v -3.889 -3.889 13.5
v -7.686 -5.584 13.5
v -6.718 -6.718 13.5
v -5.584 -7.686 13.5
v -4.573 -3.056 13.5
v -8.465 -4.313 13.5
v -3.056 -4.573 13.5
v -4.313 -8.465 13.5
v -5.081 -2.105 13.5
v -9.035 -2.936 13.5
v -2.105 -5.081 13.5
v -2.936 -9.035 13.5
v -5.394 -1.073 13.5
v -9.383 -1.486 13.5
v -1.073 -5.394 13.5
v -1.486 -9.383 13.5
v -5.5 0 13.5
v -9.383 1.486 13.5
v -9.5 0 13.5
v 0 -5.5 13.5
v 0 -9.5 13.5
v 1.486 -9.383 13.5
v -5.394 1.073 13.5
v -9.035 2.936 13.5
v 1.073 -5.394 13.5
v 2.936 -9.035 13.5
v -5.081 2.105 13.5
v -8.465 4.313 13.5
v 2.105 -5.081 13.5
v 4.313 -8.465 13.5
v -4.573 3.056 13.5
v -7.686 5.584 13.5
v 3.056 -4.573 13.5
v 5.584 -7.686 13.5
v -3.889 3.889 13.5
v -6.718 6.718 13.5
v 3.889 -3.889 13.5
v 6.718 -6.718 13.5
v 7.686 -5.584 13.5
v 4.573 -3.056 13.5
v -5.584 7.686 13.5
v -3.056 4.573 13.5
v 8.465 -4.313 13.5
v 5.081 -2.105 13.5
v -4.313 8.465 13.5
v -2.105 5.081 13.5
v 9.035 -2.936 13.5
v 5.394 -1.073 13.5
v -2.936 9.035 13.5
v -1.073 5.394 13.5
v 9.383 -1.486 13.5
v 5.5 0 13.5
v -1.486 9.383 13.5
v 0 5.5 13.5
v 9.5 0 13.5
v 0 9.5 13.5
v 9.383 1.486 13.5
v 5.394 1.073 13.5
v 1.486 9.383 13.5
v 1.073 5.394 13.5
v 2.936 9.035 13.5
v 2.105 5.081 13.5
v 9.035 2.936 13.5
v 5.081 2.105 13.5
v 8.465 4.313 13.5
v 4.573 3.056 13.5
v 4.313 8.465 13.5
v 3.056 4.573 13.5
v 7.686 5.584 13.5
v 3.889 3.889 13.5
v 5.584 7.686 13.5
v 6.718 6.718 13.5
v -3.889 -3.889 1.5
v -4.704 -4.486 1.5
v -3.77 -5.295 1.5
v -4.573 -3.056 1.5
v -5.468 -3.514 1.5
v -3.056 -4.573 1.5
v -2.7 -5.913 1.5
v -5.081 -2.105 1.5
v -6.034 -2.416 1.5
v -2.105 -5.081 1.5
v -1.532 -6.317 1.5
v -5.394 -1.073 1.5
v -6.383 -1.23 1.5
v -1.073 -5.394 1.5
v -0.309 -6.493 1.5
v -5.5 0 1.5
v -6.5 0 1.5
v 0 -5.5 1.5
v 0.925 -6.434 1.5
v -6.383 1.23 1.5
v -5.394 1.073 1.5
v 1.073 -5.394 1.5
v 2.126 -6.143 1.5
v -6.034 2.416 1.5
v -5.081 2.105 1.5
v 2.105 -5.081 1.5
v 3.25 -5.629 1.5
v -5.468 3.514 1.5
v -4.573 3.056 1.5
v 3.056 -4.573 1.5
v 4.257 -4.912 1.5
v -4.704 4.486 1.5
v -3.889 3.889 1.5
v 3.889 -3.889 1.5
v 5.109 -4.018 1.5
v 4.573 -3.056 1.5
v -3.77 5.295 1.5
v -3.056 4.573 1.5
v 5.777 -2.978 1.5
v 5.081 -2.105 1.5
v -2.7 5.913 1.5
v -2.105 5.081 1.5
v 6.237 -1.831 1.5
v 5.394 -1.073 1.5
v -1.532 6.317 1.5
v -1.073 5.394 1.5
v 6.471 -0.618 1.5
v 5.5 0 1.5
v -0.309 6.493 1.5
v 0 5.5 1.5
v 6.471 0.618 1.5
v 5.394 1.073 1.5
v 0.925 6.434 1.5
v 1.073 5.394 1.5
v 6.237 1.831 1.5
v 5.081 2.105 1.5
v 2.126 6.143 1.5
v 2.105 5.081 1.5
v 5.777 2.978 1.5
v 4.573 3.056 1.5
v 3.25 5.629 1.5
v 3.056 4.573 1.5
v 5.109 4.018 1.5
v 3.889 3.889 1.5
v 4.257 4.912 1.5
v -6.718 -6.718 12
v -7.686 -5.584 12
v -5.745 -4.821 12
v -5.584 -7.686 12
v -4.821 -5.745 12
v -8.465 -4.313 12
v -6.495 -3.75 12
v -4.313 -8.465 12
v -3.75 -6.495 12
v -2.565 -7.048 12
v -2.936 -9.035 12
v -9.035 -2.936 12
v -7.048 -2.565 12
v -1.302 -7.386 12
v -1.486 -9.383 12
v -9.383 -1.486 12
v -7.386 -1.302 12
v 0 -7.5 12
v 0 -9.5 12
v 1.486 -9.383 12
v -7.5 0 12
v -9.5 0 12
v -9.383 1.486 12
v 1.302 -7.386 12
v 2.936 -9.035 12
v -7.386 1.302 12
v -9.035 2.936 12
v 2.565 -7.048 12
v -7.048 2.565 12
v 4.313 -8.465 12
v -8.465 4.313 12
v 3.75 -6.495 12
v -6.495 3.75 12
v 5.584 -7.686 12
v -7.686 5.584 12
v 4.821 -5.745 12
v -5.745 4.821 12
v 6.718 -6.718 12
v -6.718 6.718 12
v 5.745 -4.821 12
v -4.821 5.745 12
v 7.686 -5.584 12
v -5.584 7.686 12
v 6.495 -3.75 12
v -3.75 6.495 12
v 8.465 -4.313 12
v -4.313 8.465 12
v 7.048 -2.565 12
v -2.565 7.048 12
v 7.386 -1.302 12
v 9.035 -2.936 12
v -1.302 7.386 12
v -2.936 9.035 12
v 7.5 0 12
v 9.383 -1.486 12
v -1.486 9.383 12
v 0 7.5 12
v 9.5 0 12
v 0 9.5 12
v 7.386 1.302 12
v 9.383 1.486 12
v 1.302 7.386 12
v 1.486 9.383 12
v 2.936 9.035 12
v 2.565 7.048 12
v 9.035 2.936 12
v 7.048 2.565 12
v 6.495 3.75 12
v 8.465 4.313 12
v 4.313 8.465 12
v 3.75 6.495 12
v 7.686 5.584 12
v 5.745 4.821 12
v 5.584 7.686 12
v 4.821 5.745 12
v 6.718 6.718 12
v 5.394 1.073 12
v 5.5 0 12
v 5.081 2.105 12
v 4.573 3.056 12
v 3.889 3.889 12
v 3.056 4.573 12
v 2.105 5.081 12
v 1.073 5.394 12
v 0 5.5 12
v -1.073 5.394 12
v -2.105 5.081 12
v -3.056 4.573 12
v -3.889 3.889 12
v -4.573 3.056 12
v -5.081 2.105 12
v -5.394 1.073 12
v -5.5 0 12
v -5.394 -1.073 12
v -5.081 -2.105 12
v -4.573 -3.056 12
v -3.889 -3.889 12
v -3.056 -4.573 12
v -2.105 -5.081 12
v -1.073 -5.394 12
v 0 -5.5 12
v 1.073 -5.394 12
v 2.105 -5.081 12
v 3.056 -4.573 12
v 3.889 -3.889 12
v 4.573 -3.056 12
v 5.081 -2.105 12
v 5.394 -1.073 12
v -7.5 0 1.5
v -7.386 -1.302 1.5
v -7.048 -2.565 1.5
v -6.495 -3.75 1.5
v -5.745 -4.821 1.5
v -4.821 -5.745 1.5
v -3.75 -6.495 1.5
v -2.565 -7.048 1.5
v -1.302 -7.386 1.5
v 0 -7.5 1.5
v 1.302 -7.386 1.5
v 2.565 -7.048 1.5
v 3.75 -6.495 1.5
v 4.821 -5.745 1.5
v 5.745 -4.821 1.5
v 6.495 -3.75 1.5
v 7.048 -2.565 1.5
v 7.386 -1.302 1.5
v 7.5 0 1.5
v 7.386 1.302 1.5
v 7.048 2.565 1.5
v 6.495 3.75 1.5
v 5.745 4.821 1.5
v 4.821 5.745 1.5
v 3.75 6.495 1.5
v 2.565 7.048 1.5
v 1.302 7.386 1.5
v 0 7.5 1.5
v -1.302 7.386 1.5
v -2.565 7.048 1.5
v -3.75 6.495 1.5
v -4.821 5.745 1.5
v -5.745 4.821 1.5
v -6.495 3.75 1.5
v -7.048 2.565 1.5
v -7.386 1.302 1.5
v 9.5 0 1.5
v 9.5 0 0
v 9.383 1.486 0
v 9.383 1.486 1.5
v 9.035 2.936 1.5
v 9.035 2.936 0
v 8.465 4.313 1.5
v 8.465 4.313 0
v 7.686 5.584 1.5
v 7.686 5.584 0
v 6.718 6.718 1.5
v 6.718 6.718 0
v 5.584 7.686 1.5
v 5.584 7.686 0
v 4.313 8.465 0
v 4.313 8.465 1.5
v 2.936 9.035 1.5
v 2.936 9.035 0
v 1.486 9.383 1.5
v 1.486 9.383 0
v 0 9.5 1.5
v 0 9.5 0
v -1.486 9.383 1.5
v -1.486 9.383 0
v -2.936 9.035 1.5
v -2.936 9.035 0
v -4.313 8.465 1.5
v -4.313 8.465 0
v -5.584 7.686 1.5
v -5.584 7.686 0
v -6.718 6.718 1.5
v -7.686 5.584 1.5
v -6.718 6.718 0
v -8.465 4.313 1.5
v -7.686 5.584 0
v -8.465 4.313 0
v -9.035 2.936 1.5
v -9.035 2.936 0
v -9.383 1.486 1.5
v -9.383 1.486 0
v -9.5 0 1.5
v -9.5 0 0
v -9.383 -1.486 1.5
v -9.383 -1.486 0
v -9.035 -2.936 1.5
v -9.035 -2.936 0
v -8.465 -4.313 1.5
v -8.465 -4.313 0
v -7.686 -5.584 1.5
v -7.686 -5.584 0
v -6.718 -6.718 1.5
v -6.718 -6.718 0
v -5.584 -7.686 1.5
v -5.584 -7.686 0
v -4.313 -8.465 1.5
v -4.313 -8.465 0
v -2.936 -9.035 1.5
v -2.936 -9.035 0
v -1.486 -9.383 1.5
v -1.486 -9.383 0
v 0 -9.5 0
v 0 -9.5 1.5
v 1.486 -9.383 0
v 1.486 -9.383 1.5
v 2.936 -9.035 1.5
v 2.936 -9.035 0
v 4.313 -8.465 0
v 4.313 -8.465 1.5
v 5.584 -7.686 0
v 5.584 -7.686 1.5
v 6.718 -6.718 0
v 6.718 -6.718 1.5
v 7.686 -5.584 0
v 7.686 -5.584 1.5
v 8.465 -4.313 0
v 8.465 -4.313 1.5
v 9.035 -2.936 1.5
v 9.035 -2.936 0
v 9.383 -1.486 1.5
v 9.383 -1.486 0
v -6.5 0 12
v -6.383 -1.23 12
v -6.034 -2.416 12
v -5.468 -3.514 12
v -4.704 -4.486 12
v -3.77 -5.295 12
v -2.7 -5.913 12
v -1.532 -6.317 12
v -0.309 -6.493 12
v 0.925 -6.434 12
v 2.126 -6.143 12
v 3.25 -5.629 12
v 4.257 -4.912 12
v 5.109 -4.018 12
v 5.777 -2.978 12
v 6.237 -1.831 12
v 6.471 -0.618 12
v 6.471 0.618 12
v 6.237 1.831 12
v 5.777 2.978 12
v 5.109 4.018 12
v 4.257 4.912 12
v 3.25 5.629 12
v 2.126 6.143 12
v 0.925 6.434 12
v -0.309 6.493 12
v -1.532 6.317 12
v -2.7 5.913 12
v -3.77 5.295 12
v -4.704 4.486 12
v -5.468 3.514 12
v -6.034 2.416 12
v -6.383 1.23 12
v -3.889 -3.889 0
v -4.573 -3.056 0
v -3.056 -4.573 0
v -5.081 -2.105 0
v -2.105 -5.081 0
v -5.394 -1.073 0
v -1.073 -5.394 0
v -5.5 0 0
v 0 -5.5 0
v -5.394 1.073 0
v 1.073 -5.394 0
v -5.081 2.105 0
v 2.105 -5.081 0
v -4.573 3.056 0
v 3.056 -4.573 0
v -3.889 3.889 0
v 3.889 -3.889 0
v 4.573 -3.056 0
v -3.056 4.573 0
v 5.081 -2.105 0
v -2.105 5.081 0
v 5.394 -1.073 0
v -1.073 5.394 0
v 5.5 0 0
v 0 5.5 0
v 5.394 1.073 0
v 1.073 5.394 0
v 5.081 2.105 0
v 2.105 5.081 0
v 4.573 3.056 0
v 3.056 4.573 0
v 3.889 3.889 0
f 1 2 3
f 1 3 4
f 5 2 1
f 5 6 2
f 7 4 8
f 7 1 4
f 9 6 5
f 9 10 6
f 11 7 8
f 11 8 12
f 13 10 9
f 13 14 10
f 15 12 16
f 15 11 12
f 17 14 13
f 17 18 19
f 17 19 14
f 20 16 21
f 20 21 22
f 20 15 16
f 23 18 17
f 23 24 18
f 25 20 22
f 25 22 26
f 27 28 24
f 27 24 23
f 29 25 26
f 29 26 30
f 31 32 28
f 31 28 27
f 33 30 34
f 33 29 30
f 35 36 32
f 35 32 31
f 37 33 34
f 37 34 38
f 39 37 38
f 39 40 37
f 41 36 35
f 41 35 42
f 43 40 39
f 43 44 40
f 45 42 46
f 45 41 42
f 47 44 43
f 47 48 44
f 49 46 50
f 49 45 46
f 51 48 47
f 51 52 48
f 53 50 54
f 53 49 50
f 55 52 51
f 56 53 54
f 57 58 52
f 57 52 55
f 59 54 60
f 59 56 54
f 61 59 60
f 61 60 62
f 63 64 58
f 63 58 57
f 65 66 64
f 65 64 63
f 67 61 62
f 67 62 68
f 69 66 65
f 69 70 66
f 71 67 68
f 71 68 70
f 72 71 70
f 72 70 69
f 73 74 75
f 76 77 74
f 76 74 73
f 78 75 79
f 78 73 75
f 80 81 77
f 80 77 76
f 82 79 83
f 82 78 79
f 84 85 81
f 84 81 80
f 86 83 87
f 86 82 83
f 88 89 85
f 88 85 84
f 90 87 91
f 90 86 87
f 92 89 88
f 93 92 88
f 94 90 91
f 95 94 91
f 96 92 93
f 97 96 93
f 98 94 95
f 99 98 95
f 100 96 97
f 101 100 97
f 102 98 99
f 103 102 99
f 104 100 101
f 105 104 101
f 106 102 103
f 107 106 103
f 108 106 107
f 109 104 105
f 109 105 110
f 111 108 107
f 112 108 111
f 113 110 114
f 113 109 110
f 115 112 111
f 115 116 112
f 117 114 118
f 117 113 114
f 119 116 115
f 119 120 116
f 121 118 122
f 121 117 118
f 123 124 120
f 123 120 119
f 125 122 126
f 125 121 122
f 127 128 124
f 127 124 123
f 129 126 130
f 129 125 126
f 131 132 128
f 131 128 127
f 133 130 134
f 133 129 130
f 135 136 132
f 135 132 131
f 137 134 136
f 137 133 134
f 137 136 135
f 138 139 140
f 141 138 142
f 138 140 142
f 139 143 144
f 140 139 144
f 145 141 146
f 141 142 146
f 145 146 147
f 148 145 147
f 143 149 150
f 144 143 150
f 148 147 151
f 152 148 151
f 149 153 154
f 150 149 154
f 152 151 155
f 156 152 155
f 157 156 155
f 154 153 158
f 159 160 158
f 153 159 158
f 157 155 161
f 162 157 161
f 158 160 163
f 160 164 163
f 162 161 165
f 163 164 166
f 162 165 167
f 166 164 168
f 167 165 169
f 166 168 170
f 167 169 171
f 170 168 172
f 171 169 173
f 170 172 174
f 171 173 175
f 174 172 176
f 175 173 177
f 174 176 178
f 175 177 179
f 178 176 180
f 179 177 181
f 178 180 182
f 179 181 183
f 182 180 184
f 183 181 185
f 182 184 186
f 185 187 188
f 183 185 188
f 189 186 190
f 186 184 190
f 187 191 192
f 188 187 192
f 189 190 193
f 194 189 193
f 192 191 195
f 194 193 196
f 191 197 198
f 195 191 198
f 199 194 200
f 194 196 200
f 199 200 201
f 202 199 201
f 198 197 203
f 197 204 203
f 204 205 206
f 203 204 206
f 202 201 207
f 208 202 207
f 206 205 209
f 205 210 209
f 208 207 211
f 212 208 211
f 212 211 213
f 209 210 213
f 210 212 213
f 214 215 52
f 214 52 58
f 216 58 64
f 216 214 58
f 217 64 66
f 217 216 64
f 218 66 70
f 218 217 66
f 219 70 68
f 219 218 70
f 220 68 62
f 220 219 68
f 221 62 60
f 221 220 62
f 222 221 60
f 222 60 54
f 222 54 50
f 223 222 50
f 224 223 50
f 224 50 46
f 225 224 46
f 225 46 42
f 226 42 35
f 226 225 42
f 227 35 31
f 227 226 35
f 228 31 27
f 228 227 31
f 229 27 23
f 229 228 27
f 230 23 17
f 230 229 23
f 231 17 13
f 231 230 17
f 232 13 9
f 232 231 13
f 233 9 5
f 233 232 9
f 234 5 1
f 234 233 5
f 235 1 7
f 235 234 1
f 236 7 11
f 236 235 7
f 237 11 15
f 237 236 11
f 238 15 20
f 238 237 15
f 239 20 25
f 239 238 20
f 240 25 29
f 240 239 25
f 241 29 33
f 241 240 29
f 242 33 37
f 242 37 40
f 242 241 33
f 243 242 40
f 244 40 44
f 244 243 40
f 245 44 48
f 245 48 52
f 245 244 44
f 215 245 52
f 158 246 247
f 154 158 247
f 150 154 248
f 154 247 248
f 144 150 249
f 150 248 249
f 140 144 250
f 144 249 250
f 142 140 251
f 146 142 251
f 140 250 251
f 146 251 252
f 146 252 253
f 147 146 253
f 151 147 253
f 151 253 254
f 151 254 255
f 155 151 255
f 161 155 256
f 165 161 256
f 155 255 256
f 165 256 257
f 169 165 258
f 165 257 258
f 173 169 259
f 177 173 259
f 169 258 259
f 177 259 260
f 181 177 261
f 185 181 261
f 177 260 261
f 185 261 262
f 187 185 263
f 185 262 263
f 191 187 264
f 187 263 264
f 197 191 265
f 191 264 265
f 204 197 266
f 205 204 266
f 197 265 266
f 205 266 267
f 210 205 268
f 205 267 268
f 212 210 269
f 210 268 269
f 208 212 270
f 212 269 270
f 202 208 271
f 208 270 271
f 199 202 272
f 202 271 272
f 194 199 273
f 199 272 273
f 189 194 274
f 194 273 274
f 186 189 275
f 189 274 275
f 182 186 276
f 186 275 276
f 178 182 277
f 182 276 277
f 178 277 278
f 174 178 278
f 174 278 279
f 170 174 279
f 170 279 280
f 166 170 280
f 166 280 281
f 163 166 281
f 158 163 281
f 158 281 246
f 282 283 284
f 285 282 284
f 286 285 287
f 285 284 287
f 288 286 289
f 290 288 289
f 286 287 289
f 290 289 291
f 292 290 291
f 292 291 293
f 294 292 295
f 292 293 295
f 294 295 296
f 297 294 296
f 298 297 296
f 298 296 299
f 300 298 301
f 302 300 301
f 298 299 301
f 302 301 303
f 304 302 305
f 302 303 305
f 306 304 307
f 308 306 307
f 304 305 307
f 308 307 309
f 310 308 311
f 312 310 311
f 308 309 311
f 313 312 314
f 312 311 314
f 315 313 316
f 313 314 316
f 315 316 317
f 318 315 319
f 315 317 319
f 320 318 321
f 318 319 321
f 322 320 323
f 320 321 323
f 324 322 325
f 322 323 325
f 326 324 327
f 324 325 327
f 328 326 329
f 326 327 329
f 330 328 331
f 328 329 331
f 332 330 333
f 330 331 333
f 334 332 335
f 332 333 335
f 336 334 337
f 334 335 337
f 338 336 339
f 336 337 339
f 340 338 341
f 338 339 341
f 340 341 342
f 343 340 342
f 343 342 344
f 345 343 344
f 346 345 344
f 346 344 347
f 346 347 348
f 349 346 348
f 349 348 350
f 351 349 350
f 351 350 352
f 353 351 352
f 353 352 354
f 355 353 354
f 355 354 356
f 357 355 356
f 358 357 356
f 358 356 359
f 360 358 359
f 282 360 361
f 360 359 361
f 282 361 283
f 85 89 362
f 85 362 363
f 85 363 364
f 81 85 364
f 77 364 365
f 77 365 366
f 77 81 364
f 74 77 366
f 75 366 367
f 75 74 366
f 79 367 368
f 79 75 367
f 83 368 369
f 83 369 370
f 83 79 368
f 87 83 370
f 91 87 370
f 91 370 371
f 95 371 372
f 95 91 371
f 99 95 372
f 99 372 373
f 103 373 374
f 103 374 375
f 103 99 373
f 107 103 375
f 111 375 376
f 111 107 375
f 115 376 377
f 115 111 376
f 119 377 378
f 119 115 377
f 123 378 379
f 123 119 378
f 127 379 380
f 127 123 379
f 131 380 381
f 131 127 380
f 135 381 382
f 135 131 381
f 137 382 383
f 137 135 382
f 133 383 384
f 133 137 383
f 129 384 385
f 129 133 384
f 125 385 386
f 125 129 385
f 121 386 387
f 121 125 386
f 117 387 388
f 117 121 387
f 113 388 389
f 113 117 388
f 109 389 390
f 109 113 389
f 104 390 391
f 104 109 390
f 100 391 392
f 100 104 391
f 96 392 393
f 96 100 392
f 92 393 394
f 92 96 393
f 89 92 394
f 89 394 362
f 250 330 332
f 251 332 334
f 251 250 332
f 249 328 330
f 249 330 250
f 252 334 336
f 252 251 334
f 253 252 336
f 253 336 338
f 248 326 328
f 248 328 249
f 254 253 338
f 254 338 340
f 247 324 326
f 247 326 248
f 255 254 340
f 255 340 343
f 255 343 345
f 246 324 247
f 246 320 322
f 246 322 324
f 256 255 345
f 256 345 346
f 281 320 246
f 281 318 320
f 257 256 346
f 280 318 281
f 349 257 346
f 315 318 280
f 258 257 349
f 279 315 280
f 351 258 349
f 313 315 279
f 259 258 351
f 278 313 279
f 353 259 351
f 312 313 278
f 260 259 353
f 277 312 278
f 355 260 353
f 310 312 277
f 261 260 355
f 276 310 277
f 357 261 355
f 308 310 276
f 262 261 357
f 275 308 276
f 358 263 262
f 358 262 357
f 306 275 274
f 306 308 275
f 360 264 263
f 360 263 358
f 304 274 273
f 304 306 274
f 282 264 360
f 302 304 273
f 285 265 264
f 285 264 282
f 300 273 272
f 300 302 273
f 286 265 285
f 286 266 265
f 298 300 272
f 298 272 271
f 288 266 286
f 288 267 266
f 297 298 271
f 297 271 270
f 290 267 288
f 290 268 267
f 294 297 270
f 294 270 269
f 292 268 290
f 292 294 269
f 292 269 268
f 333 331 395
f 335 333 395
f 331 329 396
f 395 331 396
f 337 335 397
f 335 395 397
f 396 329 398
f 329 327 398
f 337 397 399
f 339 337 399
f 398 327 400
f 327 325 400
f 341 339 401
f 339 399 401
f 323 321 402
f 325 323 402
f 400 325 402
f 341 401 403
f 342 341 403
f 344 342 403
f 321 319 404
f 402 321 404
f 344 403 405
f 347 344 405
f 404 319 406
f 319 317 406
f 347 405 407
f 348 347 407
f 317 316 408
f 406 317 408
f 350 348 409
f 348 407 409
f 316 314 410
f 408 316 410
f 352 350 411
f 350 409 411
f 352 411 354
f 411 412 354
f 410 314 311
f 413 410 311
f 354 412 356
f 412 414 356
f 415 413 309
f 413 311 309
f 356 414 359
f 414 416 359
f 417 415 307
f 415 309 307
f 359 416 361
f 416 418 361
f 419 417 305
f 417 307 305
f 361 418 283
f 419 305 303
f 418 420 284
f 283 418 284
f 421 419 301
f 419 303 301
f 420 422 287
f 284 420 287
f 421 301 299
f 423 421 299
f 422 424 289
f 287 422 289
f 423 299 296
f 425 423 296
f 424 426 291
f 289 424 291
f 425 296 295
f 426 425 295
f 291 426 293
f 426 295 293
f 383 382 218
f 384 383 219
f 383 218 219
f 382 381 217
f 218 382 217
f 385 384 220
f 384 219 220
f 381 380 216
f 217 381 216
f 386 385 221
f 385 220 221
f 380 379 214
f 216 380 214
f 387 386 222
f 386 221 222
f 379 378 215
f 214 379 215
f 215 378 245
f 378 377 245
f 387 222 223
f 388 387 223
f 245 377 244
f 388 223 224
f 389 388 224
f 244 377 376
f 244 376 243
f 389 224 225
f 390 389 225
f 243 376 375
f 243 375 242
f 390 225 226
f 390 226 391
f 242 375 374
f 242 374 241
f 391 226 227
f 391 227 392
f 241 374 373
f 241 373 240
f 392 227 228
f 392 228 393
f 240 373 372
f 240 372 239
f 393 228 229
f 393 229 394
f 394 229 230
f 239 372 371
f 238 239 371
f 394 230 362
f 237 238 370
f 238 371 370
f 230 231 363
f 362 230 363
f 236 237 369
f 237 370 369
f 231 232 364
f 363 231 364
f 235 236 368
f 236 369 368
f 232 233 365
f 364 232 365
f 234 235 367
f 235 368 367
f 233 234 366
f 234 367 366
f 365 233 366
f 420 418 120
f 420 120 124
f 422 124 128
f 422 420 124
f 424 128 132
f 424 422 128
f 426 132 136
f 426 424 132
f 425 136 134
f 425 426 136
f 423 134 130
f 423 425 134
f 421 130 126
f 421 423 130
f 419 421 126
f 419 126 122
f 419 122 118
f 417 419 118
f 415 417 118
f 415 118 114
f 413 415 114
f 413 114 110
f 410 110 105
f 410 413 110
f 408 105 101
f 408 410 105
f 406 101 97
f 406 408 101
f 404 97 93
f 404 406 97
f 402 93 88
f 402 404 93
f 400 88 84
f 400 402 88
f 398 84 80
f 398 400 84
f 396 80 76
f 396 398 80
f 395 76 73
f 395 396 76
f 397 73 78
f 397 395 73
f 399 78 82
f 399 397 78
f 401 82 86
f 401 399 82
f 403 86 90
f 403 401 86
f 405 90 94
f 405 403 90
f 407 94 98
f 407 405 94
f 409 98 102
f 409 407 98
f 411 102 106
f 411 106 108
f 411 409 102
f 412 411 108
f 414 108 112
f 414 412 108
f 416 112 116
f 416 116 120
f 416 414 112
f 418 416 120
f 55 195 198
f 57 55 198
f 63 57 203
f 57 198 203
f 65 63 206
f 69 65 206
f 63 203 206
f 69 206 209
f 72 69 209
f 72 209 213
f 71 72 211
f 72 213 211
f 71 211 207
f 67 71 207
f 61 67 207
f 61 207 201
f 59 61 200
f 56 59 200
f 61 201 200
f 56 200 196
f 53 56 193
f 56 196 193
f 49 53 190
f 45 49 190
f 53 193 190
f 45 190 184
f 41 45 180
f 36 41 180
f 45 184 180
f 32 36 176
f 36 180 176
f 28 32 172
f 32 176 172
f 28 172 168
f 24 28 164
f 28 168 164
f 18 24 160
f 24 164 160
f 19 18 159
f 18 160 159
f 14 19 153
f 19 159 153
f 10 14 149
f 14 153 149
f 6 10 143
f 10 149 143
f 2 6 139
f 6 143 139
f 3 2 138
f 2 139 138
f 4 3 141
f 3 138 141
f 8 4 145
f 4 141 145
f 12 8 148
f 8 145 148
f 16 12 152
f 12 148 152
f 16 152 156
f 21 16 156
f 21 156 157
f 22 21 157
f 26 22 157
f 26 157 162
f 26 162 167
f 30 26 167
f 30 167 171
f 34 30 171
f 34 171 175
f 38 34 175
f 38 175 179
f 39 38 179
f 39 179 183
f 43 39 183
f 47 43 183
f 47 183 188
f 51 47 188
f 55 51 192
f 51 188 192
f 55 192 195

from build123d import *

# Parameters (mm, degrees)
ESQUISSE1_R        = 9.5
ESQUISSE1_R_2      = 6.45
ESQUISSE1_R_3      = 5.5
BOSS_EXTRU_1_DEPTH = 1.5
ESQUISSE1_3_R      = 6.45
ESQUISSE1_3_R_2    = 5.5
BOSS_EXTRU_4_DEPTH = 1.5
ESQUISSE6_R        = 7.5
ESQUISSE6_R_2      = 6.5
BOSS_EXTRU_5_DEPTH = 10.5
ESQUISSE7_R        = 9.5
ESQUISSE7_R_2      = 7.5
ESQUISSE7_R_3      = 6.5
ESQUISSE7_R_4      = 5.5
BOSS_EXTRU_6_DEPTH = 1.5


with BuildPart() as part:
    # Esquisse1 → Boss.-Extru.1 (new body)
    # profile 1 of 2: a face of its own
    with BuildSketch(Plane.XY):
        Circle(ESQUISSE1_R)
        Circle(ESQUISSE1_R_2, mode=Mode.SUBTRACT)
    # profile 2 of 2: a face of its own
    with BuildSketch(Plane.XY):
        Circle(ESQUISSE1_R_2)
        Circle(ESQUISSE1_R_3, mode=Mode.SUBTRACT)
    extrude(amount=BOSS_EXTRU_1_DEPTH)

    # Esquisse1<3> → Boss.-Extru.4 (add)
    with BuildSketch(Plane.XY):
        Circle(ESQUISSE1_3_R)
        Circle(ESQUISSE1_3_R_2, mode=Mode.SUBTRACT)
    extrude(amount=BOSS_EXTRU_4_DEPTH)

    # Esquisse6 → Boss.-Extru.5 (add)
    with BuildSketch(Plane.XY.offset(1.5)):
        with Locations(Location((0, 0, 0), (0, 0, 180))):
            Circle(ESQUISSE6_R)
        with Locations(Location((0, 0, 0), (0, 0, 180))):
            Circle(ESQUISSE6_R_2, mode=Mode.SUBTRACT)
    extrude(amount=BOSS_EXTRU_5_DEPTH)

    # Esquisse7 → Boss.-Extru.6 (add)
    # profile 1 of 3: a face of its own
    with BuildSketch(Plane.XY.offset(12)):
        Circle(ESQUISSE7_R)
        with Locations(Location((0, 0, 0), (0, 0, 180))):
            Circle(ESQUISSE7_R_2, mode=Mode.SUBTRACT)
    # profile 2 of 3: a face of its own
    with BuildSketch(Plane.XY.offset(12)):
        with Locations(Location((0, 0, 0), (0, 0, 180))):
            Circle(ESQUISSE7_R_2)
        with Locations(Location((0, 0, 0), (0, 0, 180))):
            Circle(ESQUISSE7_R_3, mode=Mode.SUBTRACT)
    # profile 3 of 3: a face of its own
    with BuildSketch(Plane.XY.offset(12)):
        with Locations(Location((0, 0, 0), (0, 0, 180))):
            Circle(ESQUISSE7_R_3)
        Circle(ESQUISSE7_R_4, mode=Mode.SUBTRACT)
    extrude(amount=BOSS_EXTRU_6_DEPTH)


solid = part.part
